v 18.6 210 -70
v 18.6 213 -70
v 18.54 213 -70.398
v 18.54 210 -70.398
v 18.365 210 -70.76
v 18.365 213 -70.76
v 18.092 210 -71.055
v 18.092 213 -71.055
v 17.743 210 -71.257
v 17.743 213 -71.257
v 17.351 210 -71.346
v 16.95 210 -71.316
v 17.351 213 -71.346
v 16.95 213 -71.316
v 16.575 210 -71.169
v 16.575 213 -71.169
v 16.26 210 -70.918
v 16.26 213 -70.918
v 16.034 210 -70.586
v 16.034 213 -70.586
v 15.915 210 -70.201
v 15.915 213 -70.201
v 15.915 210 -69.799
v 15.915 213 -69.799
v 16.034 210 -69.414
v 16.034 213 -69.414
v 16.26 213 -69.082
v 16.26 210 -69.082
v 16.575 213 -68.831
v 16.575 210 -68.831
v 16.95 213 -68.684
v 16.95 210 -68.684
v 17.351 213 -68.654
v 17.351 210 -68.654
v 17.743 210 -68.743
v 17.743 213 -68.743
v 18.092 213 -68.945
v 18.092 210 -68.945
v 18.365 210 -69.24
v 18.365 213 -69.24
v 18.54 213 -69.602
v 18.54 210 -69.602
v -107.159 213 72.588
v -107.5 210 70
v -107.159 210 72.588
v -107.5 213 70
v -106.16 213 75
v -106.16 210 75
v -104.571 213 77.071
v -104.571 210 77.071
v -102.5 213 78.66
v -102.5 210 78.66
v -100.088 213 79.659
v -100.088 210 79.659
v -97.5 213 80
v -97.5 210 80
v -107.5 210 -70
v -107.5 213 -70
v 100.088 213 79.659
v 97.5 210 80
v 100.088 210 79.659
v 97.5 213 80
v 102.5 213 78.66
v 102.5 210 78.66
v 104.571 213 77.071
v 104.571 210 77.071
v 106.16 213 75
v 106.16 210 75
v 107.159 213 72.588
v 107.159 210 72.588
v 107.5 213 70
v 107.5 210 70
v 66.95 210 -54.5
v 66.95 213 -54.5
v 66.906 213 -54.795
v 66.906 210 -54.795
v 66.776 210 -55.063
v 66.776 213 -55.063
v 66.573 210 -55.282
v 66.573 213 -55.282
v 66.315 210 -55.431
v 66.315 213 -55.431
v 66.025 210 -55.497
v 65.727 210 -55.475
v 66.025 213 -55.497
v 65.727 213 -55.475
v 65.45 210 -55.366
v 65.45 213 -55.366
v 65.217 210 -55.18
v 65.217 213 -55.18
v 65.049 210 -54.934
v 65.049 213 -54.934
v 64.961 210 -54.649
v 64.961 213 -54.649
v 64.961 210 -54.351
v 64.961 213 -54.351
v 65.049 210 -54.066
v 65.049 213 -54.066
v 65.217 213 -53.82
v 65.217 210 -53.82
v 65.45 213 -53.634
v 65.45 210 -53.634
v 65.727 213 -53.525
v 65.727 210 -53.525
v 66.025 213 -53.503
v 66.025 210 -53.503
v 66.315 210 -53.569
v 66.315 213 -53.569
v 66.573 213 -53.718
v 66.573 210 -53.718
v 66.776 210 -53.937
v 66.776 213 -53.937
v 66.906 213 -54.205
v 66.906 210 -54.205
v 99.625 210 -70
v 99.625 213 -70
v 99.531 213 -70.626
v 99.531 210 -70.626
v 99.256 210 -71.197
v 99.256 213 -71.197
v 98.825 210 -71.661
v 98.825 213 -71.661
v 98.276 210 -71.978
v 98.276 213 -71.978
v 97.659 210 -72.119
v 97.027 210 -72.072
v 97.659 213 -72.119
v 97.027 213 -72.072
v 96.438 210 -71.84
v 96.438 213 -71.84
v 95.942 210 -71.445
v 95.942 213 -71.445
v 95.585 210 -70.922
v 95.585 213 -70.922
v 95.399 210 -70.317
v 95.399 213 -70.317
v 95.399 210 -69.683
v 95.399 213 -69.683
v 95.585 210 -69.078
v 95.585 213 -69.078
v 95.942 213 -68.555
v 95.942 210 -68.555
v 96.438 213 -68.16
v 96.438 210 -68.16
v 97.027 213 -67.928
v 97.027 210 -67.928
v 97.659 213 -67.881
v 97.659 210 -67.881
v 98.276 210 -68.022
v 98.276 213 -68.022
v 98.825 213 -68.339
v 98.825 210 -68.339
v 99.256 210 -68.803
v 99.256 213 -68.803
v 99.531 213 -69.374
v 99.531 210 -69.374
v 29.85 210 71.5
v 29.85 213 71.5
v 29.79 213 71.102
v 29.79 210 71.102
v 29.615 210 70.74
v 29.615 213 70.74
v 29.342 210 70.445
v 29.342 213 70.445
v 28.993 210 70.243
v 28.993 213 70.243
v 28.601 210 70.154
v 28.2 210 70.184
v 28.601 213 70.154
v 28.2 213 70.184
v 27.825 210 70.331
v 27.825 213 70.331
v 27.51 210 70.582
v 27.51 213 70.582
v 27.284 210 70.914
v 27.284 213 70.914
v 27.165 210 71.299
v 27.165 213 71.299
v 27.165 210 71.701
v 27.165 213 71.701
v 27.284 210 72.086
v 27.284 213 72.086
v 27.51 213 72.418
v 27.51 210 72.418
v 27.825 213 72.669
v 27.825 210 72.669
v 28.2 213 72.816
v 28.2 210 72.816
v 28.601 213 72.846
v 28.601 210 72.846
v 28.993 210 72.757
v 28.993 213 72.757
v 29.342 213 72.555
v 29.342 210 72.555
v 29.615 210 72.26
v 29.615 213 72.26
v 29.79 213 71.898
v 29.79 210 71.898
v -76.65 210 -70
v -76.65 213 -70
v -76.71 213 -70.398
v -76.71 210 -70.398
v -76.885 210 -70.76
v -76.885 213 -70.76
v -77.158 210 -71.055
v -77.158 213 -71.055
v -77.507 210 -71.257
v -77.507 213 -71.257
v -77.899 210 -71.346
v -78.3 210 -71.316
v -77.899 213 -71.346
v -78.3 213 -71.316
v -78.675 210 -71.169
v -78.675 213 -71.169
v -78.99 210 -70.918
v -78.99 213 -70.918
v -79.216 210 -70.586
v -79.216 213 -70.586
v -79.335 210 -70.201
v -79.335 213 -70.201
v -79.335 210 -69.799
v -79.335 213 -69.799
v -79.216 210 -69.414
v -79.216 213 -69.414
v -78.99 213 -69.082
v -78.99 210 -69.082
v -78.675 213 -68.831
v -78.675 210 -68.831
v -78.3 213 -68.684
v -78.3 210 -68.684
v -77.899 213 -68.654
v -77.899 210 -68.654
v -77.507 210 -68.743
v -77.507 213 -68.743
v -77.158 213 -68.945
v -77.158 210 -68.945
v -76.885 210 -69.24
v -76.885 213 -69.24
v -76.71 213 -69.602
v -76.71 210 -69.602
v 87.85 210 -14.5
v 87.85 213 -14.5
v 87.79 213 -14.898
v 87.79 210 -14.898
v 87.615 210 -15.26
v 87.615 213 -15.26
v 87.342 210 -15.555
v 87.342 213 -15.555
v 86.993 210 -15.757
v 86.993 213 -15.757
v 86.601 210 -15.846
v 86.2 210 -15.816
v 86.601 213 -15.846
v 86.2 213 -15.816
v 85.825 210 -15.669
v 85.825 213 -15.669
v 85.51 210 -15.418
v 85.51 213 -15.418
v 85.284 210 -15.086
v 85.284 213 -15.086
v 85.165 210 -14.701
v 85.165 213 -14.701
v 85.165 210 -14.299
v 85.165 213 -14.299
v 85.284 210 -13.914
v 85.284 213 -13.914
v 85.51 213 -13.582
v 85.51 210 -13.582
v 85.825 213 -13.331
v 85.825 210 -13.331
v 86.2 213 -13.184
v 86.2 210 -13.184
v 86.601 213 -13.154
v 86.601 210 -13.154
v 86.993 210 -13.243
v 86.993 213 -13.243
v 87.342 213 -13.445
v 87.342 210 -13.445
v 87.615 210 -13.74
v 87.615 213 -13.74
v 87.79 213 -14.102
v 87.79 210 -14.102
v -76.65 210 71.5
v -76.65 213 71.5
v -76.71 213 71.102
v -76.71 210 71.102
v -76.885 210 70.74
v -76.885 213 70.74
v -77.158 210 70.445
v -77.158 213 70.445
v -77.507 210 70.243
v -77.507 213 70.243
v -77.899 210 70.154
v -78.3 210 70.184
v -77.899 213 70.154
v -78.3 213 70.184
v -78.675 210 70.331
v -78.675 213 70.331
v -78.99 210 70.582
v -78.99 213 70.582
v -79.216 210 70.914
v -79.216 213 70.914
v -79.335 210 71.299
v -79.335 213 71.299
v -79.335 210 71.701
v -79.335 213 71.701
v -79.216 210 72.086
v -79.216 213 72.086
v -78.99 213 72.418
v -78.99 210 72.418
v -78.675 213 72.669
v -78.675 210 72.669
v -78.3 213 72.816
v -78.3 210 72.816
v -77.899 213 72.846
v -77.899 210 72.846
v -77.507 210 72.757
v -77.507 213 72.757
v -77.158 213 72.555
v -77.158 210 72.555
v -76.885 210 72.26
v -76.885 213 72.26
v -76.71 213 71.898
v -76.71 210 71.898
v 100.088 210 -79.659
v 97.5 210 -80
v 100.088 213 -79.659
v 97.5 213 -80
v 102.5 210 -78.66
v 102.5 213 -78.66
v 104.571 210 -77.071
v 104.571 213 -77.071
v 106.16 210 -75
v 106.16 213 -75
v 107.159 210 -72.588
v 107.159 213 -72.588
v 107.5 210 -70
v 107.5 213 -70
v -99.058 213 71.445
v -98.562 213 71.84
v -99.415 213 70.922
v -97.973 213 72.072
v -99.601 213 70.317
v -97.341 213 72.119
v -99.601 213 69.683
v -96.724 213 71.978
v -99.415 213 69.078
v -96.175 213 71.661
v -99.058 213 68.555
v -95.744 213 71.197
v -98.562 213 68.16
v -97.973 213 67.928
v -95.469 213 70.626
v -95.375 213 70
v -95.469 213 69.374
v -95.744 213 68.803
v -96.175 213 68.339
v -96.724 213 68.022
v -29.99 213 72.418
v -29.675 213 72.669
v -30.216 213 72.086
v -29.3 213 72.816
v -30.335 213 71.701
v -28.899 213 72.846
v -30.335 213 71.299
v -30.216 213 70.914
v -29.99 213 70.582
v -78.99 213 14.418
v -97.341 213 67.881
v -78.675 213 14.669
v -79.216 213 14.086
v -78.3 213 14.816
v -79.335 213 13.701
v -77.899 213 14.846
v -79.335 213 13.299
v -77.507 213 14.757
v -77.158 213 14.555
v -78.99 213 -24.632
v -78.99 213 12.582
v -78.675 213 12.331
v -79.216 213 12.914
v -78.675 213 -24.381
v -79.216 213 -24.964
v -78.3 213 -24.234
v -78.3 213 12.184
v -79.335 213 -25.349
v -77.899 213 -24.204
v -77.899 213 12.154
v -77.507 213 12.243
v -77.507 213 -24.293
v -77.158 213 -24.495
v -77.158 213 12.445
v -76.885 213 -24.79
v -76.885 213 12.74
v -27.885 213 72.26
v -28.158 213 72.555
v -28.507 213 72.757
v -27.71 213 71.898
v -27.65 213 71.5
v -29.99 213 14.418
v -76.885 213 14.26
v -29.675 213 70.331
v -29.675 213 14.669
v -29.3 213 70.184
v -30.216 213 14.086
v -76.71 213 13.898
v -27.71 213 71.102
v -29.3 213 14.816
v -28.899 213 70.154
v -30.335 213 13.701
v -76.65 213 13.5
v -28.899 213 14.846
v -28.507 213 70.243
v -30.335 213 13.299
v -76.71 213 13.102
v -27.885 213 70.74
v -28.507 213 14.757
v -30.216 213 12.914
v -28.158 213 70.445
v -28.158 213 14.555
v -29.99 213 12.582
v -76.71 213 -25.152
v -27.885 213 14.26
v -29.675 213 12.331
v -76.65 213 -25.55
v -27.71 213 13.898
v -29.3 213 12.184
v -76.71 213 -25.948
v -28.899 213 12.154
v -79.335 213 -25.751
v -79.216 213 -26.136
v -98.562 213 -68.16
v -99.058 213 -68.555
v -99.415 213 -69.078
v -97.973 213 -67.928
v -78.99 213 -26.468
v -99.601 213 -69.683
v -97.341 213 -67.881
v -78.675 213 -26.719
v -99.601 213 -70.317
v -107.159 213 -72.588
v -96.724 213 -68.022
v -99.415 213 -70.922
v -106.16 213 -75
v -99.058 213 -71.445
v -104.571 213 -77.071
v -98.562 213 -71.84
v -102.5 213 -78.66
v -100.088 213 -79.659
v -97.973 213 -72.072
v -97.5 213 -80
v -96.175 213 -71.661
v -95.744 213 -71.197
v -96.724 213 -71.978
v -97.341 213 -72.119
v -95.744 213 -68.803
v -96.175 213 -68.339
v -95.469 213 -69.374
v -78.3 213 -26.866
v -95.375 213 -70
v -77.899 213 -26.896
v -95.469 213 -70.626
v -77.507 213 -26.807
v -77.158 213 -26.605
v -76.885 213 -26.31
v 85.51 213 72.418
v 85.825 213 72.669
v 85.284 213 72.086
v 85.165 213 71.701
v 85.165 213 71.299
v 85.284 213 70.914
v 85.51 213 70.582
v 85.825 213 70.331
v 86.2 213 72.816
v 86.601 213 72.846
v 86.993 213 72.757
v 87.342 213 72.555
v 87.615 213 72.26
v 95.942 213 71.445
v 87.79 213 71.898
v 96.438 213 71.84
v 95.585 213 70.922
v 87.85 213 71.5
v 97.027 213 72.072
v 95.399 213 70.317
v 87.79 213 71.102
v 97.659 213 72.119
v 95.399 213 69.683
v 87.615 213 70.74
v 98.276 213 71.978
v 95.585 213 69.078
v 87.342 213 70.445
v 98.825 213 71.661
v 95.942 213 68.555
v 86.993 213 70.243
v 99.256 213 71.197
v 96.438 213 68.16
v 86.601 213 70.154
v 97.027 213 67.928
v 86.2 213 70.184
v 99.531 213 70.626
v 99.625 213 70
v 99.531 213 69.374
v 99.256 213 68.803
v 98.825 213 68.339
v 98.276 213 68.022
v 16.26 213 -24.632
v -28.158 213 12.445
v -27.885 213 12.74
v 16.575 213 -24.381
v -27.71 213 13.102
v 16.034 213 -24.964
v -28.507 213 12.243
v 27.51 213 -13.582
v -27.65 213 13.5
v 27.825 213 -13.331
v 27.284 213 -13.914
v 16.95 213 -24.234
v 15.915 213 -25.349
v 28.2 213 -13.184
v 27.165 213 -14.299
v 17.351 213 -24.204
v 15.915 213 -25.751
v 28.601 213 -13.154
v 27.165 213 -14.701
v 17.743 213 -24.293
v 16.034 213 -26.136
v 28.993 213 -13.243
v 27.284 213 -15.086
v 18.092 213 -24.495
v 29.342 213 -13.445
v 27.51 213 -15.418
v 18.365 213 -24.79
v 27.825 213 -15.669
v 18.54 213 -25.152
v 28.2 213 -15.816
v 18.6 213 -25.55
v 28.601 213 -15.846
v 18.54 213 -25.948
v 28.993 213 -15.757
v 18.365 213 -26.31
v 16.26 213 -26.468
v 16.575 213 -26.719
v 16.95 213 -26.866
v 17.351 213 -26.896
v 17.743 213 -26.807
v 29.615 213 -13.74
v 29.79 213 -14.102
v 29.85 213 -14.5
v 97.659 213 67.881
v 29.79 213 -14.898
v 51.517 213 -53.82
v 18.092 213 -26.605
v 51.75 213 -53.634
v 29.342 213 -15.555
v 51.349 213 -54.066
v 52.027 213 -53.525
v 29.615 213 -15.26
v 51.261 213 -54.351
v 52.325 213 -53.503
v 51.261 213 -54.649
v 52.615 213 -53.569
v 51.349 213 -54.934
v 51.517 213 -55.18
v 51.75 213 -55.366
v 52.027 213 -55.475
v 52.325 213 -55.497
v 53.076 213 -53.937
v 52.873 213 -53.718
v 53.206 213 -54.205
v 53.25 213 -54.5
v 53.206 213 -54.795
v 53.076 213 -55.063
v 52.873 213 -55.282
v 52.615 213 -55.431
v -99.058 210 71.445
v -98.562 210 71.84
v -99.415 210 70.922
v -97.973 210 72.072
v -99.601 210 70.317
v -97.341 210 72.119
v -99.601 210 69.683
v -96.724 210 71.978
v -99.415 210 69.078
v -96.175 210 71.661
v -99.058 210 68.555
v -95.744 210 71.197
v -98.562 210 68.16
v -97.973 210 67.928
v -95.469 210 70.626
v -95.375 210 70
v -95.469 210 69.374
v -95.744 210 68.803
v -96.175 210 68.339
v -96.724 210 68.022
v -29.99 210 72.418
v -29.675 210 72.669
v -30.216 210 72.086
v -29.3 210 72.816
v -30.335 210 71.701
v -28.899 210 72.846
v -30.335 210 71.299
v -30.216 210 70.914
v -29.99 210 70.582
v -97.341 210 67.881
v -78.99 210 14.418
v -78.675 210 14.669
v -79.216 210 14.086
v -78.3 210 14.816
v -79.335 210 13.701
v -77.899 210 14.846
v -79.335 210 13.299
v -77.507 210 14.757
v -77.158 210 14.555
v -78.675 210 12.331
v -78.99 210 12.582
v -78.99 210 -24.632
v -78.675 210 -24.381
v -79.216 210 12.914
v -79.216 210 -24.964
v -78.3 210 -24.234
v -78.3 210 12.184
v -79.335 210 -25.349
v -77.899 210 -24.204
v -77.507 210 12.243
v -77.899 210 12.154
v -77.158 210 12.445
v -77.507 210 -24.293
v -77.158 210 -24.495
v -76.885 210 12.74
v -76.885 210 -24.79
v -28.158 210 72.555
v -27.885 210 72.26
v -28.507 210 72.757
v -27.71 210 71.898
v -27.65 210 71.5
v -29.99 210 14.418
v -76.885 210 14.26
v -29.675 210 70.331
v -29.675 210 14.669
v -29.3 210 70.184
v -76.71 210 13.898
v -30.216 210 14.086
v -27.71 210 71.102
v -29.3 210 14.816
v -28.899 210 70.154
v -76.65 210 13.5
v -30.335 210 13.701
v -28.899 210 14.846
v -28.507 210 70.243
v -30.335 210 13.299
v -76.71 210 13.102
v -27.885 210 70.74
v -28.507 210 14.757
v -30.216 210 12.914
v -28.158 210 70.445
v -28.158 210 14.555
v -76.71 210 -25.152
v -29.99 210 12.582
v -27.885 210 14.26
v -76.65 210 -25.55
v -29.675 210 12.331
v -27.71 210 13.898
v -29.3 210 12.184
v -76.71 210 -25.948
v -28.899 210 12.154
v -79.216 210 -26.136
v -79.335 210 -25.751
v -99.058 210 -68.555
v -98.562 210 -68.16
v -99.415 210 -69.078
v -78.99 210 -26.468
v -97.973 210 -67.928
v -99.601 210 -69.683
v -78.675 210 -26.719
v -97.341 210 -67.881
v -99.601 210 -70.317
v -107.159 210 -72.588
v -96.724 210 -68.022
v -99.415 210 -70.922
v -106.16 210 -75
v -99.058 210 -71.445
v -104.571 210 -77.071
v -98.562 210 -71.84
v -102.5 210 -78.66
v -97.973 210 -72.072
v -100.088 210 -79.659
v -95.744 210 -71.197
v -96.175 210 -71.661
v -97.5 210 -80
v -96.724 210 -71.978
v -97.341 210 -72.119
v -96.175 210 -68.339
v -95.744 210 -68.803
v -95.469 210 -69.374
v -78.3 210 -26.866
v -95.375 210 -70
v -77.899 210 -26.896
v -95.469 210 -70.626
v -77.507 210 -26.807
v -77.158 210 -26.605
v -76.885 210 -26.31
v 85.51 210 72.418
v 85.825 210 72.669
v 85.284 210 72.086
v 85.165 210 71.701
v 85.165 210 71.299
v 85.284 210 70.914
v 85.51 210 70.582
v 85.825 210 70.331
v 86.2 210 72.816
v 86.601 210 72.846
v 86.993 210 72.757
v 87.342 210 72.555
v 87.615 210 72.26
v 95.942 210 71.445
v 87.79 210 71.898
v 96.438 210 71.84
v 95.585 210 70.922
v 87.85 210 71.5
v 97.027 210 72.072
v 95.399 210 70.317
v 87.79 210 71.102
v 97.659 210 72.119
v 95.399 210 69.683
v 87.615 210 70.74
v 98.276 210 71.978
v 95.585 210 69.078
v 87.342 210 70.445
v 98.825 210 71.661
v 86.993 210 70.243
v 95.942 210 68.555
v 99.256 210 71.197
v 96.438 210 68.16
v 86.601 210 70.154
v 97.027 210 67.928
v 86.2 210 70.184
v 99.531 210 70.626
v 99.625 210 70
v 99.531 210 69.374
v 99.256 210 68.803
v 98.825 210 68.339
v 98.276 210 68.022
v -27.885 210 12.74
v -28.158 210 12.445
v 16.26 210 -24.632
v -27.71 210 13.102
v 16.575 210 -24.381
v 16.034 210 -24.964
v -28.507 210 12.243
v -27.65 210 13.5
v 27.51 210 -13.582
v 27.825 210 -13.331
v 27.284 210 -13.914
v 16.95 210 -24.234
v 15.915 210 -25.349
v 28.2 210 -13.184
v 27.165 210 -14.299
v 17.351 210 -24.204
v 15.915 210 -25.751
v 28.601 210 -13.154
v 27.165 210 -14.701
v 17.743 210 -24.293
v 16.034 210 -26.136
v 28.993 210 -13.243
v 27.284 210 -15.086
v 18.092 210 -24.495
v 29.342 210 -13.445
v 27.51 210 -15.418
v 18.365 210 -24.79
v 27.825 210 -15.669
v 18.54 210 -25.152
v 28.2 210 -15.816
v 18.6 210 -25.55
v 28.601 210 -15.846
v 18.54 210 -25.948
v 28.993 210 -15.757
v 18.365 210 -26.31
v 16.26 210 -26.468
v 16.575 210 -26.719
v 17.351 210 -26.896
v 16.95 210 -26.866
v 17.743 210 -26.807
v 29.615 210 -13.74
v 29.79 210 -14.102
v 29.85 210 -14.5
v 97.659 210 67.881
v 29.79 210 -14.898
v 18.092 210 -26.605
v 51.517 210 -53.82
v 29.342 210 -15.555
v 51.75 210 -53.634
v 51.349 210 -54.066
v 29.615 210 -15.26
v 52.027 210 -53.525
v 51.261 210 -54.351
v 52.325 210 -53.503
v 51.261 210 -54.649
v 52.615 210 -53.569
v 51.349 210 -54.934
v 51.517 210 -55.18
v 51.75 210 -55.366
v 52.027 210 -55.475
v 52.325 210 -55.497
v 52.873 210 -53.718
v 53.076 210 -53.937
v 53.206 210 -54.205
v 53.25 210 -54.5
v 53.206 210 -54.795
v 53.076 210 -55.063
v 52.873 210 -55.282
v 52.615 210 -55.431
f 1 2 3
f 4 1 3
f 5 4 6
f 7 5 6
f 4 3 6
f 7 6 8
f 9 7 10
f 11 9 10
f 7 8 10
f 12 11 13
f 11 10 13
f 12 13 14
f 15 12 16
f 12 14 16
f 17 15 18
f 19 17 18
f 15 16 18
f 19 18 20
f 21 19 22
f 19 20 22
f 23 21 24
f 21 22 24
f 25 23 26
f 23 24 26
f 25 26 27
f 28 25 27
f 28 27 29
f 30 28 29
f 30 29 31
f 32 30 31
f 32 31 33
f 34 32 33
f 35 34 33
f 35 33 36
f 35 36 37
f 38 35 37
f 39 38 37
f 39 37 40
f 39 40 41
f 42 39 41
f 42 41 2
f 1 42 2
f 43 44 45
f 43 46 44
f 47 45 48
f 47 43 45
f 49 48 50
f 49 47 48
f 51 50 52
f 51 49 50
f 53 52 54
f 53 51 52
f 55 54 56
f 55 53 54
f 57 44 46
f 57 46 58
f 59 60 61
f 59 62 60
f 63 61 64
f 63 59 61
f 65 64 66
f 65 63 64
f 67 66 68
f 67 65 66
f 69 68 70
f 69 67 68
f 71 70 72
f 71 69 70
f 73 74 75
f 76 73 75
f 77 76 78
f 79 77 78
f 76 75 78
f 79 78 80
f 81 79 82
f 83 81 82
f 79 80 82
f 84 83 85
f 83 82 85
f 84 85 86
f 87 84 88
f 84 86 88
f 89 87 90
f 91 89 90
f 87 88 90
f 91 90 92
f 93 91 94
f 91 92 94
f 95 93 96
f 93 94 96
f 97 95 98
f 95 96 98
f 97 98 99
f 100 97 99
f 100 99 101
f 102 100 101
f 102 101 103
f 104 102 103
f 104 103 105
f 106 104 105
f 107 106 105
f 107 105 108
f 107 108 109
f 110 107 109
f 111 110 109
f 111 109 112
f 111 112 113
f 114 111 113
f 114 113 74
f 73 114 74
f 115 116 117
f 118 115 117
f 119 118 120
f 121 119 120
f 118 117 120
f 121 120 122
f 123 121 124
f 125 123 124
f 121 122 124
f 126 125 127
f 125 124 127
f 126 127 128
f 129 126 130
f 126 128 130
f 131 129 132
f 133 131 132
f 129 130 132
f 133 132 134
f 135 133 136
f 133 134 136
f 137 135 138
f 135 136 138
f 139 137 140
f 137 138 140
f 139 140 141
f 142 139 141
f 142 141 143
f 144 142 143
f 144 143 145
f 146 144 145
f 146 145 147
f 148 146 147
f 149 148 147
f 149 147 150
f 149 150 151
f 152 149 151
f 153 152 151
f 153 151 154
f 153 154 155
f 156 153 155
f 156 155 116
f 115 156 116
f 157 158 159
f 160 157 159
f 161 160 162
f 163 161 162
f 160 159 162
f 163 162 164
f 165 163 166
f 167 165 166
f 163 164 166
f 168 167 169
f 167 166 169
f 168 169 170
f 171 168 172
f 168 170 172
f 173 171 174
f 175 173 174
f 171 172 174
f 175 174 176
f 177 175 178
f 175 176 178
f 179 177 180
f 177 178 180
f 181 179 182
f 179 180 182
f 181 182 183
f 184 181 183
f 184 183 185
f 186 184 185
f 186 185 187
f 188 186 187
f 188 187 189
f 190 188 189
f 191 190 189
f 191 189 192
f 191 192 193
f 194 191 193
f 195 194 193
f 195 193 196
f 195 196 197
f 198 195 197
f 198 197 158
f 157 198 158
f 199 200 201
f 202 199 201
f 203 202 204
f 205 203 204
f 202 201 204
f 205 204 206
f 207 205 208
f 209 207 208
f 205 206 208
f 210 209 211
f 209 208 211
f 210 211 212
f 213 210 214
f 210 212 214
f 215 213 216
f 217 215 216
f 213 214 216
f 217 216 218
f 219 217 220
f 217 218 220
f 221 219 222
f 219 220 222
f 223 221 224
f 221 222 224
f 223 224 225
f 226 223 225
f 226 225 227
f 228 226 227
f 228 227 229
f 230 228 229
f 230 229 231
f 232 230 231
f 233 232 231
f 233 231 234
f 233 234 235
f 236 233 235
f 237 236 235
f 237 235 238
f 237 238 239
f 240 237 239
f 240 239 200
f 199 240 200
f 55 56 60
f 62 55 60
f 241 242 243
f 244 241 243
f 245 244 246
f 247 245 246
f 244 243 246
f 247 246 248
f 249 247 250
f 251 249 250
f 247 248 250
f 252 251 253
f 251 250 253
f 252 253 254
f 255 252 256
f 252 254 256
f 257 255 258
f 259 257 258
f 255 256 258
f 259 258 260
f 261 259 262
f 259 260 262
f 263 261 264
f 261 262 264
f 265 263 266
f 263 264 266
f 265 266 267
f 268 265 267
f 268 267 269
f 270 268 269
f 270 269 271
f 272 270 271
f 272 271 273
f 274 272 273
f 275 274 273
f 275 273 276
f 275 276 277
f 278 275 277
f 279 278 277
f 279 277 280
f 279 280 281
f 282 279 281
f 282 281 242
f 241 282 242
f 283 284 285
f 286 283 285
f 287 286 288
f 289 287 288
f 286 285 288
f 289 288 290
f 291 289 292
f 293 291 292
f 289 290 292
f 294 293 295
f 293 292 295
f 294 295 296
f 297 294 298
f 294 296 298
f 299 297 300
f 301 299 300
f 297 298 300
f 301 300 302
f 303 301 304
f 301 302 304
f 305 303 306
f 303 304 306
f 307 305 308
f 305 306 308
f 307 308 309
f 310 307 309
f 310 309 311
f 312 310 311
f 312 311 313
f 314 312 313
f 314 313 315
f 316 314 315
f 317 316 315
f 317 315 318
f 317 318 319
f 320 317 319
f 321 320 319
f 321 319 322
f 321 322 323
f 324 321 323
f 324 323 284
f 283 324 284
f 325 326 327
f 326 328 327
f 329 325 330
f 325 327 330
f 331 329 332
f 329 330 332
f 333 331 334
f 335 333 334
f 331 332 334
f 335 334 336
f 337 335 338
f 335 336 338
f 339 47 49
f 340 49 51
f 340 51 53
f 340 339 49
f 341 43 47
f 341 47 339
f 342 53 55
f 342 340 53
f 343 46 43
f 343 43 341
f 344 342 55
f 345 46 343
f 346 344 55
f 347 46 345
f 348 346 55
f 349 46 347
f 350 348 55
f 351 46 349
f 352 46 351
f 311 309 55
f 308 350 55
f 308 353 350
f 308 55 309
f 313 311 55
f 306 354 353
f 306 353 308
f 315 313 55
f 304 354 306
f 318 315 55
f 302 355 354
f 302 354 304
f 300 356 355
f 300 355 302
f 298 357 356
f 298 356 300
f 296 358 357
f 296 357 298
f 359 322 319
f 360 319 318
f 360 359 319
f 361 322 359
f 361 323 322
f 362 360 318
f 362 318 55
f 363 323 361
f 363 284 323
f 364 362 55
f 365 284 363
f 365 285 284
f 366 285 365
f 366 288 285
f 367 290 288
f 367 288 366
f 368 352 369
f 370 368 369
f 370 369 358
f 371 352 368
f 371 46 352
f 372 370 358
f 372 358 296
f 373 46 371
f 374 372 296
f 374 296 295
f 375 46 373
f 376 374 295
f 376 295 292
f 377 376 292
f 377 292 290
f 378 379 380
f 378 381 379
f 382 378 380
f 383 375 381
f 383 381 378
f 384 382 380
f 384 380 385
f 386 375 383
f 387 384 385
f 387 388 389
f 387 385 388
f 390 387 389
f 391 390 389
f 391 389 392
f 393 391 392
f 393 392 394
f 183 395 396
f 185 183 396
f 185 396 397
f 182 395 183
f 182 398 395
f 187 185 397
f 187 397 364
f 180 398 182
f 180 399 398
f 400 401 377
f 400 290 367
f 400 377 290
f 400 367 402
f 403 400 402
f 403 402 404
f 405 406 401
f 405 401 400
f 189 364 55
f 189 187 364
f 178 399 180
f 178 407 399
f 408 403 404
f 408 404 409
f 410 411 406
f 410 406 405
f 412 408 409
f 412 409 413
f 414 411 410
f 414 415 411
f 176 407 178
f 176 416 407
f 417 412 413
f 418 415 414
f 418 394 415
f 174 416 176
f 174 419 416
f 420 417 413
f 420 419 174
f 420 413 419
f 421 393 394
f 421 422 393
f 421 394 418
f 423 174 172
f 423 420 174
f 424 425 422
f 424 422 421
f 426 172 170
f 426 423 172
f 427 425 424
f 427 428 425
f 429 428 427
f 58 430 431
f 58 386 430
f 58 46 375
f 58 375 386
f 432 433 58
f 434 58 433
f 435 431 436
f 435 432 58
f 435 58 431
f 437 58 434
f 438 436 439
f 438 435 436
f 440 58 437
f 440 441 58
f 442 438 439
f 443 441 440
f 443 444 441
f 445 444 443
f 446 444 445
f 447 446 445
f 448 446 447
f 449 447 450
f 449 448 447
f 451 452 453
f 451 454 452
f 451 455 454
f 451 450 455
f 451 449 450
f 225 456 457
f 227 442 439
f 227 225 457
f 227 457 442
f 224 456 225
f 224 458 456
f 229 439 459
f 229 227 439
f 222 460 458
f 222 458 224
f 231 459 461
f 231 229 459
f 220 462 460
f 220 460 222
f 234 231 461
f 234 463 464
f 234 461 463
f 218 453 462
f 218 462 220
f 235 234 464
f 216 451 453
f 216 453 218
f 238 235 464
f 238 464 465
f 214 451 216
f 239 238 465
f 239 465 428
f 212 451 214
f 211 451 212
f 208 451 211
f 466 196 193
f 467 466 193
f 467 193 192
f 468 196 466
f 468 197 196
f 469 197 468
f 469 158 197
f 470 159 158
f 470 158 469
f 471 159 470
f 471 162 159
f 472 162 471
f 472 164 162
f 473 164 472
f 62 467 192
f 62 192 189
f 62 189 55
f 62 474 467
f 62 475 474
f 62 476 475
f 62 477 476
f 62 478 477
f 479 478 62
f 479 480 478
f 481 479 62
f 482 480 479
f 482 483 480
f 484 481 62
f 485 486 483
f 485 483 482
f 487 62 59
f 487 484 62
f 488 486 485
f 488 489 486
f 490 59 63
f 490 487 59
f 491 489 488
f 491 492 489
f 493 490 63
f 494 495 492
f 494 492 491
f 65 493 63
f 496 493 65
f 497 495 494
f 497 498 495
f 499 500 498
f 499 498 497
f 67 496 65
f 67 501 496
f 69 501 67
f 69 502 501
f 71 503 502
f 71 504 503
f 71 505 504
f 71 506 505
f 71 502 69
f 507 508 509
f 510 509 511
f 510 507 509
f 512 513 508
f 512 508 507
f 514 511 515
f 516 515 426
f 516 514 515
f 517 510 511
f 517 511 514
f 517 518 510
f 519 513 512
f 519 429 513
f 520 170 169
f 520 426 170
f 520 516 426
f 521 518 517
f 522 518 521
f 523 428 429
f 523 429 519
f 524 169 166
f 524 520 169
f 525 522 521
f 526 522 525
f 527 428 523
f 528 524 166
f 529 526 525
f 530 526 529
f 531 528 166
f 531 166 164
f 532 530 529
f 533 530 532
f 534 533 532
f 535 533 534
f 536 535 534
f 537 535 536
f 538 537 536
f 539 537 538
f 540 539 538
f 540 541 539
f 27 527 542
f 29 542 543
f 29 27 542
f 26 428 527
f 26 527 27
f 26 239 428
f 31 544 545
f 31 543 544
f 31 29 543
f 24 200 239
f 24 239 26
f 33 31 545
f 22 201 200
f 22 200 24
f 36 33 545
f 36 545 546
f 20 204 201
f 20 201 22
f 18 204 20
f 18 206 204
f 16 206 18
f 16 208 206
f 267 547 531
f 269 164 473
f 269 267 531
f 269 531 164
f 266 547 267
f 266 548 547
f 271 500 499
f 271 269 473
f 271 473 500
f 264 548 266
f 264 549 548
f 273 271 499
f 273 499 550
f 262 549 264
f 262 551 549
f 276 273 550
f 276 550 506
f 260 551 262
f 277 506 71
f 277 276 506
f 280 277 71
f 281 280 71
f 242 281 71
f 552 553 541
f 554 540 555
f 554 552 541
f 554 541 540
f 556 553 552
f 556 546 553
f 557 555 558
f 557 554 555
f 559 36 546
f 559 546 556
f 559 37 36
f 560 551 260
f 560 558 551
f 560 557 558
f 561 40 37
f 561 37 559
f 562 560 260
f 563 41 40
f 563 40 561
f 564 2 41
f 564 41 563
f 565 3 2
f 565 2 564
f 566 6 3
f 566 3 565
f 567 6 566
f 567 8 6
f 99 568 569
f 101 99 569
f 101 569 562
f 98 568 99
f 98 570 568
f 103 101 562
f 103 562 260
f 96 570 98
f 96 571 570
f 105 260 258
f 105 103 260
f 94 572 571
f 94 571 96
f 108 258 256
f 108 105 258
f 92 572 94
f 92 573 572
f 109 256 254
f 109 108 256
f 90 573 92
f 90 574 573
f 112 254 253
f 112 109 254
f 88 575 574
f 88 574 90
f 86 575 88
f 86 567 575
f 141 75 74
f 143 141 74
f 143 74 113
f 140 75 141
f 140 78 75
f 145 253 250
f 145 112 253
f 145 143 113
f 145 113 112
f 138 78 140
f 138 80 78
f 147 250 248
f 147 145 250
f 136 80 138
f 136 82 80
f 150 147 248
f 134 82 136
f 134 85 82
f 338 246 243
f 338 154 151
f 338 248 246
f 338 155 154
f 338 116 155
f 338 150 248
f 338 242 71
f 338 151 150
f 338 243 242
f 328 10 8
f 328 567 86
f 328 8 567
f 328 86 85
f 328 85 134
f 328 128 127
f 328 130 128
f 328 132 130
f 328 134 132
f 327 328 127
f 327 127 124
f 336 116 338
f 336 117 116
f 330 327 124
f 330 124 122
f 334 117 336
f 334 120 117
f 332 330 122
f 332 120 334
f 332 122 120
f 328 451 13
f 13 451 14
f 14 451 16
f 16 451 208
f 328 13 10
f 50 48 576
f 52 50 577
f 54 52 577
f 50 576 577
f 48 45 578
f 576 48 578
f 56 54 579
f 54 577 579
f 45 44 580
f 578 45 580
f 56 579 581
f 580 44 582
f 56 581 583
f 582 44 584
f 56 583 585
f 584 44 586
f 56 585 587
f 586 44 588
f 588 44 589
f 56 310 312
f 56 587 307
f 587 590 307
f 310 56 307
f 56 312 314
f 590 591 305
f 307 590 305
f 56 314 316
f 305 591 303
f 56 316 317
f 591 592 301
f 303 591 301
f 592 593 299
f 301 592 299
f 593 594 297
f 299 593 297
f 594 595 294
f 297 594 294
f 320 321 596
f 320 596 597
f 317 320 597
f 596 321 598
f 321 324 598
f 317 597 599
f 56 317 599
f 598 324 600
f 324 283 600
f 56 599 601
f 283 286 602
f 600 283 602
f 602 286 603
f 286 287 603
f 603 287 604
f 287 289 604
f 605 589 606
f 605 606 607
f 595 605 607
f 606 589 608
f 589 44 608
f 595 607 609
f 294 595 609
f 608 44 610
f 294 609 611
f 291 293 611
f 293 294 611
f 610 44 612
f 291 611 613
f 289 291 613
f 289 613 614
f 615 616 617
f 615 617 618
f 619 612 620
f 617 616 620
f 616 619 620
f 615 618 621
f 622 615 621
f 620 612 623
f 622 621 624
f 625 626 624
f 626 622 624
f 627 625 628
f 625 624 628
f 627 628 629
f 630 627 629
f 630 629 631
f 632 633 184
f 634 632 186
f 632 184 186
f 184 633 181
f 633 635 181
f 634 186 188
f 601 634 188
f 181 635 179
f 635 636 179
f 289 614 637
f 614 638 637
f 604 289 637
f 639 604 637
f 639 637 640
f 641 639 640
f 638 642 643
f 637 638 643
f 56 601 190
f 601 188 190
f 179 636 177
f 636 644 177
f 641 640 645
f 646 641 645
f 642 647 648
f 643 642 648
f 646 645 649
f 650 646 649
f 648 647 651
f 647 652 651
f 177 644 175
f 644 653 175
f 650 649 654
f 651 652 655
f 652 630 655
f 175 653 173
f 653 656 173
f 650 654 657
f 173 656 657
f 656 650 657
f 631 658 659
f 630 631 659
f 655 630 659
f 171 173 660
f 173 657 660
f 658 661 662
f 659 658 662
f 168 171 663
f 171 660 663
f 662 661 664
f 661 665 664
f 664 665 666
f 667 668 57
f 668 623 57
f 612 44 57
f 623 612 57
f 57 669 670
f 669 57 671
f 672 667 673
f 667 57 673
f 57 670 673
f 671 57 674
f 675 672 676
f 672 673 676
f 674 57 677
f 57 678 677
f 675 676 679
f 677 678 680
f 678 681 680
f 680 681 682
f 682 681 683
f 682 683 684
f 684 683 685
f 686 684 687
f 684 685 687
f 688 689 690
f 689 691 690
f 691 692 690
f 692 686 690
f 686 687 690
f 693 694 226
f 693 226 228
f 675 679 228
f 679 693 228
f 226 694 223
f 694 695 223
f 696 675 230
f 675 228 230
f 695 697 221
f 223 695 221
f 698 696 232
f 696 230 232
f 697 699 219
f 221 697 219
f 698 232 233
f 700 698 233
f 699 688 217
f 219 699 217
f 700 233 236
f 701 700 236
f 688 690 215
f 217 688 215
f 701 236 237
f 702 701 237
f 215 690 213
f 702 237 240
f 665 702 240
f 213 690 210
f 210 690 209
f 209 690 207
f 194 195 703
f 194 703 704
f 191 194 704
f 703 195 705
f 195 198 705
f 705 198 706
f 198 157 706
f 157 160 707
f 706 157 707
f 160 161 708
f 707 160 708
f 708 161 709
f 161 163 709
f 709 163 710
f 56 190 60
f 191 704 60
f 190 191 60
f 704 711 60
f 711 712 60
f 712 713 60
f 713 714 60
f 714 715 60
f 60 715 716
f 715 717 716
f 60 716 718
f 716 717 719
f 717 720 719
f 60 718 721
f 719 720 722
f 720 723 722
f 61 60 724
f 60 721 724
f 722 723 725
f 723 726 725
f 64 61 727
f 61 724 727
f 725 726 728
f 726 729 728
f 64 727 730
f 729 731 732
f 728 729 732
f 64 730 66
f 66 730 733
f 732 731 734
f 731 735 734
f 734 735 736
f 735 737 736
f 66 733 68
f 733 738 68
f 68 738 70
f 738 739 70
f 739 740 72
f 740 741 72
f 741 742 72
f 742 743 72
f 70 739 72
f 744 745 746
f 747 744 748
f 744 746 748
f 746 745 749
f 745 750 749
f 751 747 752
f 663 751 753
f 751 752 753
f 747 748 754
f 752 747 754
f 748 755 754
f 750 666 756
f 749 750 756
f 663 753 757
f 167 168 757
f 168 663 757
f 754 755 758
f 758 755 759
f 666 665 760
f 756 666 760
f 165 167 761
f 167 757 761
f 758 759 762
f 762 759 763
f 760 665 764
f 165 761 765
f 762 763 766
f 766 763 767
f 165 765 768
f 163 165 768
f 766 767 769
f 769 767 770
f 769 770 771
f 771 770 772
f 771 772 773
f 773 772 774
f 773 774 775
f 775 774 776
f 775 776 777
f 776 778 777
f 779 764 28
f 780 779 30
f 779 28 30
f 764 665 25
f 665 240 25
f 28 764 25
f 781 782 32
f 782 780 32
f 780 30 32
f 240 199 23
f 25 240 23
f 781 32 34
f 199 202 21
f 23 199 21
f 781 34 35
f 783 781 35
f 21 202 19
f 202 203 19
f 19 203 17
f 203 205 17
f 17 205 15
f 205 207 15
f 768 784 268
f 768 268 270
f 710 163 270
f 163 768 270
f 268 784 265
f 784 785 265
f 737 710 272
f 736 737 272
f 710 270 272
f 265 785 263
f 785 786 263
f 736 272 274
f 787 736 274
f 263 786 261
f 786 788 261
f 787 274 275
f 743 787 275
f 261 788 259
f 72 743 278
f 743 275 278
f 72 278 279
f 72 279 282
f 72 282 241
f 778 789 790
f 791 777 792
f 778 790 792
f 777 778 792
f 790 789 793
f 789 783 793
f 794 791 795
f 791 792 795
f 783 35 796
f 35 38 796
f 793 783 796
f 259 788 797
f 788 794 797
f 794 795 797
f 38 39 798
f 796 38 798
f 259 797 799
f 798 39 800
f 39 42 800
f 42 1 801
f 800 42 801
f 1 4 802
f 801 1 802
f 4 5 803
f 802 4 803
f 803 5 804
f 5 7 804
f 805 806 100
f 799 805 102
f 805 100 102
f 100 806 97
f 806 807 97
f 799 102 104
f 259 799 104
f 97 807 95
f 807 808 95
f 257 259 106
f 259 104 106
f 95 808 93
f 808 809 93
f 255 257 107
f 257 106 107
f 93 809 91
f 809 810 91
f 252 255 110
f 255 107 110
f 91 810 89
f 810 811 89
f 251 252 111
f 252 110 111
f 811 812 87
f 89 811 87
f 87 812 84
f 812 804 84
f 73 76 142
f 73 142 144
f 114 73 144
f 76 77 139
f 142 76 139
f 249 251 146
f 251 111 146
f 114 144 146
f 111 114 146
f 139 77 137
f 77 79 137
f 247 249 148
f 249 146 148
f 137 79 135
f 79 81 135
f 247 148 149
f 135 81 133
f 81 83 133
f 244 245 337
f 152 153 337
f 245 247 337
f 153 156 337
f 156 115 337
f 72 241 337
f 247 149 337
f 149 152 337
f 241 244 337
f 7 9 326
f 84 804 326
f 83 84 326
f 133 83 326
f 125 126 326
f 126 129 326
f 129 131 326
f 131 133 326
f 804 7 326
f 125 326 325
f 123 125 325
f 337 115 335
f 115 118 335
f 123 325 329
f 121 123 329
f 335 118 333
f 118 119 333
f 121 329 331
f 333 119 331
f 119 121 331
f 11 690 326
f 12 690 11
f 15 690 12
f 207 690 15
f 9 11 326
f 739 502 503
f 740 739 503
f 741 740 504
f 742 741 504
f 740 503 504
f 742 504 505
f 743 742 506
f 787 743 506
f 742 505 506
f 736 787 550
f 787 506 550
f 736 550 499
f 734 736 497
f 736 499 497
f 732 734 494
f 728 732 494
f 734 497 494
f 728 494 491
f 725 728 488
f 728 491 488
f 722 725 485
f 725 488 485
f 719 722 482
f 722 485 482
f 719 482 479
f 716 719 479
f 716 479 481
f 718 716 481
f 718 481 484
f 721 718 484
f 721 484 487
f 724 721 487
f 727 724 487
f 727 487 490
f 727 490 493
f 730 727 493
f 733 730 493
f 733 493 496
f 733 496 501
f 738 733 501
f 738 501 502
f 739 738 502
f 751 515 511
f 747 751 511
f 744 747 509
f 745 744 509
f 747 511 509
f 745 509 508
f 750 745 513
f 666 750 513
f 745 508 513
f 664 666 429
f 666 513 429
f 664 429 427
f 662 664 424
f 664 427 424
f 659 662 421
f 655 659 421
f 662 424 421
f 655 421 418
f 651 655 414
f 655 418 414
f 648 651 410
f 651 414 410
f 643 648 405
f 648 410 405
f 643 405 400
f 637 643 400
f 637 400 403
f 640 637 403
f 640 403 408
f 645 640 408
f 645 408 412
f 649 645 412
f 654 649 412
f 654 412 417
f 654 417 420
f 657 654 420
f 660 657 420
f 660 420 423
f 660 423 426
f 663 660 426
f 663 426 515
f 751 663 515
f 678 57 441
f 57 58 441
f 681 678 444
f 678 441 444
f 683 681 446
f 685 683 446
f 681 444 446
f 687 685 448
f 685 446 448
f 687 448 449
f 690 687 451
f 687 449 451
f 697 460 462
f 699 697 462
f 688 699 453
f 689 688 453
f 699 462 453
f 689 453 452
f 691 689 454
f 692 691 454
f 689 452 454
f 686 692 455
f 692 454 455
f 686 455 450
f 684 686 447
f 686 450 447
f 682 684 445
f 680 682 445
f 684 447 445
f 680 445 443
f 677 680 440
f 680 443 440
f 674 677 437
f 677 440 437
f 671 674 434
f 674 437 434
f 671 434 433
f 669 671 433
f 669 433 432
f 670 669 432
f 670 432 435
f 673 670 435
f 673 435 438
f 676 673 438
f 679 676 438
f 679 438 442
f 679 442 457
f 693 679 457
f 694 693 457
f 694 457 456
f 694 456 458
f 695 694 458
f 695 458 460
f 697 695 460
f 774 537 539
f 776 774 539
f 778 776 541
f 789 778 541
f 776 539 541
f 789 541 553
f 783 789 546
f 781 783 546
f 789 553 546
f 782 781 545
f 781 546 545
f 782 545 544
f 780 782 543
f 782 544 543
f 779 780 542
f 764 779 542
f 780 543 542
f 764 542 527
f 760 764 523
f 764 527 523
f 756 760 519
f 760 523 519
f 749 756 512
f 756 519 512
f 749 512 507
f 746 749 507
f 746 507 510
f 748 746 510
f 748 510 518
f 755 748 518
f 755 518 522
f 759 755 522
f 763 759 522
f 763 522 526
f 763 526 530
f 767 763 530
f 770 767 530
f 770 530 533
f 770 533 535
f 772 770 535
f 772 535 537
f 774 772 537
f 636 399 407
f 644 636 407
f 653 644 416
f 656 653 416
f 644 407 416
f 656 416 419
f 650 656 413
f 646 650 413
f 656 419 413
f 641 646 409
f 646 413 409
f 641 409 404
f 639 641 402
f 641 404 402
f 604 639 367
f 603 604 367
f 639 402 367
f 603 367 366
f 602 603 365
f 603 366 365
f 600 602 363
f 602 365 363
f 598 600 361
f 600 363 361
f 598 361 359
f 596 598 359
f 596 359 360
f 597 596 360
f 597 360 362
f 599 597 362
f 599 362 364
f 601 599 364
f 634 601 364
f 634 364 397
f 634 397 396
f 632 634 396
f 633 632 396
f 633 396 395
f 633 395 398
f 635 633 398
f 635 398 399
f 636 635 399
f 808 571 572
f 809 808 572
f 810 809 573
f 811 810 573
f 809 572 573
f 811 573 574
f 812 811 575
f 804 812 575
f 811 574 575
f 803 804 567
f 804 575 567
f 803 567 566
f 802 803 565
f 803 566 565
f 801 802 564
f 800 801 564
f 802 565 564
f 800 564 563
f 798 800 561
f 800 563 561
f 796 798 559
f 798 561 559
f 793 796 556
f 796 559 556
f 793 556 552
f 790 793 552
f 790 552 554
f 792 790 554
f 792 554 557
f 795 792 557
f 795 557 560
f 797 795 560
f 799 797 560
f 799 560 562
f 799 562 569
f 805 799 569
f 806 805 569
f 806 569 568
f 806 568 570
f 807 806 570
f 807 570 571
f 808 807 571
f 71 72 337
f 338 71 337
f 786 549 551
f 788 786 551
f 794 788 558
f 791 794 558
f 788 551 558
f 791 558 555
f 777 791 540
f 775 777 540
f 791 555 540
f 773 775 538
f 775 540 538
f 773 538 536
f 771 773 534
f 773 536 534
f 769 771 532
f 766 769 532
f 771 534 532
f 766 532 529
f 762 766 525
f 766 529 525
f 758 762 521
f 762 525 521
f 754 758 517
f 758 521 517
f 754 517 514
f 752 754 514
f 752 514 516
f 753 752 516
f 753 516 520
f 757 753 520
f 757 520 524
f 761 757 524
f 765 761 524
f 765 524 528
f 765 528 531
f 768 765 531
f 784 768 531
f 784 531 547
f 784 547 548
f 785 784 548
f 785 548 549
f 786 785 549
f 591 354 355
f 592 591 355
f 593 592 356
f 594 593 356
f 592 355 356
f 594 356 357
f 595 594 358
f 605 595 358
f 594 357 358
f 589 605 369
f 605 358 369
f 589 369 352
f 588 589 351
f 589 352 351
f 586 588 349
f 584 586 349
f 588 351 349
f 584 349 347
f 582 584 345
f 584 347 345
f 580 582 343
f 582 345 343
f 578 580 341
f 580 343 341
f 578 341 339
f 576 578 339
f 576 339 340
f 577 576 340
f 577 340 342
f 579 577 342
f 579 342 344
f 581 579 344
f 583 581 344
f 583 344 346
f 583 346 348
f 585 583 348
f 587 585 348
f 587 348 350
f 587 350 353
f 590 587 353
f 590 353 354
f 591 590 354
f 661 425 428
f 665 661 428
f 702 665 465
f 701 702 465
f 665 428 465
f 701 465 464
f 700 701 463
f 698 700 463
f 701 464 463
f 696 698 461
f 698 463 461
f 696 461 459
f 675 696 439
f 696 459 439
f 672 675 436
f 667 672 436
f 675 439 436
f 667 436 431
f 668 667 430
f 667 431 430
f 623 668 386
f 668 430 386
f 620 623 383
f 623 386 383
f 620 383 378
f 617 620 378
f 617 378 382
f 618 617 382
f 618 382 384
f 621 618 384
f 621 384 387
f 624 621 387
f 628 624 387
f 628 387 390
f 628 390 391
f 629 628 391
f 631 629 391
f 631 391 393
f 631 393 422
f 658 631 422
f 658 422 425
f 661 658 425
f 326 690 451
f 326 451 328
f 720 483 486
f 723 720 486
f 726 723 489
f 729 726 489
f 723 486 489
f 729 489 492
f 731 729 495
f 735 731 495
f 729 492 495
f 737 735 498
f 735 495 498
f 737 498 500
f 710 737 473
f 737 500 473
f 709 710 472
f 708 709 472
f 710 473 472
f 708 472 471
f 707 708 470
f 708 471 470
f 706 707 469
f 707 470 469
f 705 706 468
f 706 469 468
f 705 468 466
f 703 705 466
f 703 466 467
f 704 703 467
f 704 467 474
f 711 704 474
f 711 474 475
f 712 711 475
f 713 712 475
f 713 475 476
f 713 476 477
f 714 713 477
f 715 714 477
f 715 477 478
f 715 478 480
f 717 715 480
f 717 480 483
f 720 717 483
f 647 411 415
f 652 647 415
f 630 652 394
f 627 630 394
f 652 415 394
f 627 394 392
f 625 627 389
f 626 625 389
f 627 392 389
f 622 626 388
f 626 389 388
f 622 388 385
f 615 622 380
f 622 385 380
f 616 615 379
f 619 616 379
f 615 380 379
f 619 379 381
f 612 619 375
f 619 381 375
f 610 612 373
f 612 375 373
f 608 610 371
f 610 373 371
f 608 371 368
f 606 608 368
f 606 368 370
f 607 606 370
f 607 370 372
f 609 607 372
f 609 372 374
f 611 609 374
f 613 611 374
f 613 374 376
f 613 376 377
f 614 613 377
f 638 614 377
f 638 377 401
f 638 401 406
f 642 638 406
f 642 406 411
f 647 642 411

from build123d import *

# Parameters (mm, degrees)
SKETCH1_W           = 215
SKETCH1_H           = 160
BOSS_EXTRUDE1_DEPTH = 3
SKETCH2_R           = 1.35
SKETCH2_R_2         = 1
SKETCH2_R_3         = 2.125
CUT_EXTRUDE1_DEPTH  = 4
FILLET1_R           = 10


with BuildPart() as part:
    # Sketch1 → Boss-Extrude1 (new body)
    with BuildSketch(Plane(origin=(0, 210, 0), x_dir=(1, 0, 0), z_dir=(0, 1, 0))):
        Rectangle(SKETCH1_W, SKETCH1_H)
    extrude(amount=BOSS_EXTRUDE1_DEPTH)

    # Sketch2 → Cut-Extrude1 (cut, through all)
    with BuildSketch(Plane(origin=(0, 213, 0), x_dir=(1, 0, 0), z_dir=(0, 1, 0))):
        with Locations((-78, -13.5)):
            Circle(SKETCH2_R)
        with Locations((-29, -13.5)):
            Circle(SKETCH2_R)
        with Locations((-29, -71.5)):
            Circle(SKETCH2_R)
        with Locations((-78, -71.5)):
            Circle(SKETCH2_R)
        with Locations((86.5, 14.5)):
            Circle(SKETCH2_R)
        with Locations((86.5, -71.5)):
            Circle(SKETCH2_R)
        with Locations((28.5, -71.5)):
            Circle(SKETCH2_R)
        with Locations((28.5, 14.5)):
            Circle(SKETCH2_R)
        with Locations((-78, 70)):
            Circle(SKETCH2_R)
        with Locations((-78, 25.55)):
            Circle(SKETCH2_R)
        with Locations((17.25, 25.55)):
            Circle(SKETCH2_R)
        with Locations((17.25, 70)):
            Circle(SKETCH2_R)
        with Locations((52.25, 54.5)):
            Circle(SKETCH2_R_2)
        with Locations((65.95, 54.5)):
            Circle(SKETCH2_R_2)
        with Locations((97.5, -70)):
            Circle(SKETCH2_R_3)
        with Locations((97.5, 70)):
            Circle(SKETCH2_R_3)
        with Locations((-97.5, 70)):
            Circle(SKETCH2_R_3)
        with Locations((-97.5, -70)):
            Circle(SKETCH2_R_3)
    extrude(amount=-CUT_EXTRUDE1_DEPTH, mode=Mode.SUBTRACT)

    # Fillet1
    fillet1_edges = [part.edges().sort_by_distance(p)[0] for p in [
        (-107.5, 211.5, -80),
        (107.5, 211.5, -80),
        (107.5, 211.5, 80),
        (-107.5, 211.5, 80),
    ]]
    fillet(fillet1_edges, radius=FILLET1_R)


solid = part.part
